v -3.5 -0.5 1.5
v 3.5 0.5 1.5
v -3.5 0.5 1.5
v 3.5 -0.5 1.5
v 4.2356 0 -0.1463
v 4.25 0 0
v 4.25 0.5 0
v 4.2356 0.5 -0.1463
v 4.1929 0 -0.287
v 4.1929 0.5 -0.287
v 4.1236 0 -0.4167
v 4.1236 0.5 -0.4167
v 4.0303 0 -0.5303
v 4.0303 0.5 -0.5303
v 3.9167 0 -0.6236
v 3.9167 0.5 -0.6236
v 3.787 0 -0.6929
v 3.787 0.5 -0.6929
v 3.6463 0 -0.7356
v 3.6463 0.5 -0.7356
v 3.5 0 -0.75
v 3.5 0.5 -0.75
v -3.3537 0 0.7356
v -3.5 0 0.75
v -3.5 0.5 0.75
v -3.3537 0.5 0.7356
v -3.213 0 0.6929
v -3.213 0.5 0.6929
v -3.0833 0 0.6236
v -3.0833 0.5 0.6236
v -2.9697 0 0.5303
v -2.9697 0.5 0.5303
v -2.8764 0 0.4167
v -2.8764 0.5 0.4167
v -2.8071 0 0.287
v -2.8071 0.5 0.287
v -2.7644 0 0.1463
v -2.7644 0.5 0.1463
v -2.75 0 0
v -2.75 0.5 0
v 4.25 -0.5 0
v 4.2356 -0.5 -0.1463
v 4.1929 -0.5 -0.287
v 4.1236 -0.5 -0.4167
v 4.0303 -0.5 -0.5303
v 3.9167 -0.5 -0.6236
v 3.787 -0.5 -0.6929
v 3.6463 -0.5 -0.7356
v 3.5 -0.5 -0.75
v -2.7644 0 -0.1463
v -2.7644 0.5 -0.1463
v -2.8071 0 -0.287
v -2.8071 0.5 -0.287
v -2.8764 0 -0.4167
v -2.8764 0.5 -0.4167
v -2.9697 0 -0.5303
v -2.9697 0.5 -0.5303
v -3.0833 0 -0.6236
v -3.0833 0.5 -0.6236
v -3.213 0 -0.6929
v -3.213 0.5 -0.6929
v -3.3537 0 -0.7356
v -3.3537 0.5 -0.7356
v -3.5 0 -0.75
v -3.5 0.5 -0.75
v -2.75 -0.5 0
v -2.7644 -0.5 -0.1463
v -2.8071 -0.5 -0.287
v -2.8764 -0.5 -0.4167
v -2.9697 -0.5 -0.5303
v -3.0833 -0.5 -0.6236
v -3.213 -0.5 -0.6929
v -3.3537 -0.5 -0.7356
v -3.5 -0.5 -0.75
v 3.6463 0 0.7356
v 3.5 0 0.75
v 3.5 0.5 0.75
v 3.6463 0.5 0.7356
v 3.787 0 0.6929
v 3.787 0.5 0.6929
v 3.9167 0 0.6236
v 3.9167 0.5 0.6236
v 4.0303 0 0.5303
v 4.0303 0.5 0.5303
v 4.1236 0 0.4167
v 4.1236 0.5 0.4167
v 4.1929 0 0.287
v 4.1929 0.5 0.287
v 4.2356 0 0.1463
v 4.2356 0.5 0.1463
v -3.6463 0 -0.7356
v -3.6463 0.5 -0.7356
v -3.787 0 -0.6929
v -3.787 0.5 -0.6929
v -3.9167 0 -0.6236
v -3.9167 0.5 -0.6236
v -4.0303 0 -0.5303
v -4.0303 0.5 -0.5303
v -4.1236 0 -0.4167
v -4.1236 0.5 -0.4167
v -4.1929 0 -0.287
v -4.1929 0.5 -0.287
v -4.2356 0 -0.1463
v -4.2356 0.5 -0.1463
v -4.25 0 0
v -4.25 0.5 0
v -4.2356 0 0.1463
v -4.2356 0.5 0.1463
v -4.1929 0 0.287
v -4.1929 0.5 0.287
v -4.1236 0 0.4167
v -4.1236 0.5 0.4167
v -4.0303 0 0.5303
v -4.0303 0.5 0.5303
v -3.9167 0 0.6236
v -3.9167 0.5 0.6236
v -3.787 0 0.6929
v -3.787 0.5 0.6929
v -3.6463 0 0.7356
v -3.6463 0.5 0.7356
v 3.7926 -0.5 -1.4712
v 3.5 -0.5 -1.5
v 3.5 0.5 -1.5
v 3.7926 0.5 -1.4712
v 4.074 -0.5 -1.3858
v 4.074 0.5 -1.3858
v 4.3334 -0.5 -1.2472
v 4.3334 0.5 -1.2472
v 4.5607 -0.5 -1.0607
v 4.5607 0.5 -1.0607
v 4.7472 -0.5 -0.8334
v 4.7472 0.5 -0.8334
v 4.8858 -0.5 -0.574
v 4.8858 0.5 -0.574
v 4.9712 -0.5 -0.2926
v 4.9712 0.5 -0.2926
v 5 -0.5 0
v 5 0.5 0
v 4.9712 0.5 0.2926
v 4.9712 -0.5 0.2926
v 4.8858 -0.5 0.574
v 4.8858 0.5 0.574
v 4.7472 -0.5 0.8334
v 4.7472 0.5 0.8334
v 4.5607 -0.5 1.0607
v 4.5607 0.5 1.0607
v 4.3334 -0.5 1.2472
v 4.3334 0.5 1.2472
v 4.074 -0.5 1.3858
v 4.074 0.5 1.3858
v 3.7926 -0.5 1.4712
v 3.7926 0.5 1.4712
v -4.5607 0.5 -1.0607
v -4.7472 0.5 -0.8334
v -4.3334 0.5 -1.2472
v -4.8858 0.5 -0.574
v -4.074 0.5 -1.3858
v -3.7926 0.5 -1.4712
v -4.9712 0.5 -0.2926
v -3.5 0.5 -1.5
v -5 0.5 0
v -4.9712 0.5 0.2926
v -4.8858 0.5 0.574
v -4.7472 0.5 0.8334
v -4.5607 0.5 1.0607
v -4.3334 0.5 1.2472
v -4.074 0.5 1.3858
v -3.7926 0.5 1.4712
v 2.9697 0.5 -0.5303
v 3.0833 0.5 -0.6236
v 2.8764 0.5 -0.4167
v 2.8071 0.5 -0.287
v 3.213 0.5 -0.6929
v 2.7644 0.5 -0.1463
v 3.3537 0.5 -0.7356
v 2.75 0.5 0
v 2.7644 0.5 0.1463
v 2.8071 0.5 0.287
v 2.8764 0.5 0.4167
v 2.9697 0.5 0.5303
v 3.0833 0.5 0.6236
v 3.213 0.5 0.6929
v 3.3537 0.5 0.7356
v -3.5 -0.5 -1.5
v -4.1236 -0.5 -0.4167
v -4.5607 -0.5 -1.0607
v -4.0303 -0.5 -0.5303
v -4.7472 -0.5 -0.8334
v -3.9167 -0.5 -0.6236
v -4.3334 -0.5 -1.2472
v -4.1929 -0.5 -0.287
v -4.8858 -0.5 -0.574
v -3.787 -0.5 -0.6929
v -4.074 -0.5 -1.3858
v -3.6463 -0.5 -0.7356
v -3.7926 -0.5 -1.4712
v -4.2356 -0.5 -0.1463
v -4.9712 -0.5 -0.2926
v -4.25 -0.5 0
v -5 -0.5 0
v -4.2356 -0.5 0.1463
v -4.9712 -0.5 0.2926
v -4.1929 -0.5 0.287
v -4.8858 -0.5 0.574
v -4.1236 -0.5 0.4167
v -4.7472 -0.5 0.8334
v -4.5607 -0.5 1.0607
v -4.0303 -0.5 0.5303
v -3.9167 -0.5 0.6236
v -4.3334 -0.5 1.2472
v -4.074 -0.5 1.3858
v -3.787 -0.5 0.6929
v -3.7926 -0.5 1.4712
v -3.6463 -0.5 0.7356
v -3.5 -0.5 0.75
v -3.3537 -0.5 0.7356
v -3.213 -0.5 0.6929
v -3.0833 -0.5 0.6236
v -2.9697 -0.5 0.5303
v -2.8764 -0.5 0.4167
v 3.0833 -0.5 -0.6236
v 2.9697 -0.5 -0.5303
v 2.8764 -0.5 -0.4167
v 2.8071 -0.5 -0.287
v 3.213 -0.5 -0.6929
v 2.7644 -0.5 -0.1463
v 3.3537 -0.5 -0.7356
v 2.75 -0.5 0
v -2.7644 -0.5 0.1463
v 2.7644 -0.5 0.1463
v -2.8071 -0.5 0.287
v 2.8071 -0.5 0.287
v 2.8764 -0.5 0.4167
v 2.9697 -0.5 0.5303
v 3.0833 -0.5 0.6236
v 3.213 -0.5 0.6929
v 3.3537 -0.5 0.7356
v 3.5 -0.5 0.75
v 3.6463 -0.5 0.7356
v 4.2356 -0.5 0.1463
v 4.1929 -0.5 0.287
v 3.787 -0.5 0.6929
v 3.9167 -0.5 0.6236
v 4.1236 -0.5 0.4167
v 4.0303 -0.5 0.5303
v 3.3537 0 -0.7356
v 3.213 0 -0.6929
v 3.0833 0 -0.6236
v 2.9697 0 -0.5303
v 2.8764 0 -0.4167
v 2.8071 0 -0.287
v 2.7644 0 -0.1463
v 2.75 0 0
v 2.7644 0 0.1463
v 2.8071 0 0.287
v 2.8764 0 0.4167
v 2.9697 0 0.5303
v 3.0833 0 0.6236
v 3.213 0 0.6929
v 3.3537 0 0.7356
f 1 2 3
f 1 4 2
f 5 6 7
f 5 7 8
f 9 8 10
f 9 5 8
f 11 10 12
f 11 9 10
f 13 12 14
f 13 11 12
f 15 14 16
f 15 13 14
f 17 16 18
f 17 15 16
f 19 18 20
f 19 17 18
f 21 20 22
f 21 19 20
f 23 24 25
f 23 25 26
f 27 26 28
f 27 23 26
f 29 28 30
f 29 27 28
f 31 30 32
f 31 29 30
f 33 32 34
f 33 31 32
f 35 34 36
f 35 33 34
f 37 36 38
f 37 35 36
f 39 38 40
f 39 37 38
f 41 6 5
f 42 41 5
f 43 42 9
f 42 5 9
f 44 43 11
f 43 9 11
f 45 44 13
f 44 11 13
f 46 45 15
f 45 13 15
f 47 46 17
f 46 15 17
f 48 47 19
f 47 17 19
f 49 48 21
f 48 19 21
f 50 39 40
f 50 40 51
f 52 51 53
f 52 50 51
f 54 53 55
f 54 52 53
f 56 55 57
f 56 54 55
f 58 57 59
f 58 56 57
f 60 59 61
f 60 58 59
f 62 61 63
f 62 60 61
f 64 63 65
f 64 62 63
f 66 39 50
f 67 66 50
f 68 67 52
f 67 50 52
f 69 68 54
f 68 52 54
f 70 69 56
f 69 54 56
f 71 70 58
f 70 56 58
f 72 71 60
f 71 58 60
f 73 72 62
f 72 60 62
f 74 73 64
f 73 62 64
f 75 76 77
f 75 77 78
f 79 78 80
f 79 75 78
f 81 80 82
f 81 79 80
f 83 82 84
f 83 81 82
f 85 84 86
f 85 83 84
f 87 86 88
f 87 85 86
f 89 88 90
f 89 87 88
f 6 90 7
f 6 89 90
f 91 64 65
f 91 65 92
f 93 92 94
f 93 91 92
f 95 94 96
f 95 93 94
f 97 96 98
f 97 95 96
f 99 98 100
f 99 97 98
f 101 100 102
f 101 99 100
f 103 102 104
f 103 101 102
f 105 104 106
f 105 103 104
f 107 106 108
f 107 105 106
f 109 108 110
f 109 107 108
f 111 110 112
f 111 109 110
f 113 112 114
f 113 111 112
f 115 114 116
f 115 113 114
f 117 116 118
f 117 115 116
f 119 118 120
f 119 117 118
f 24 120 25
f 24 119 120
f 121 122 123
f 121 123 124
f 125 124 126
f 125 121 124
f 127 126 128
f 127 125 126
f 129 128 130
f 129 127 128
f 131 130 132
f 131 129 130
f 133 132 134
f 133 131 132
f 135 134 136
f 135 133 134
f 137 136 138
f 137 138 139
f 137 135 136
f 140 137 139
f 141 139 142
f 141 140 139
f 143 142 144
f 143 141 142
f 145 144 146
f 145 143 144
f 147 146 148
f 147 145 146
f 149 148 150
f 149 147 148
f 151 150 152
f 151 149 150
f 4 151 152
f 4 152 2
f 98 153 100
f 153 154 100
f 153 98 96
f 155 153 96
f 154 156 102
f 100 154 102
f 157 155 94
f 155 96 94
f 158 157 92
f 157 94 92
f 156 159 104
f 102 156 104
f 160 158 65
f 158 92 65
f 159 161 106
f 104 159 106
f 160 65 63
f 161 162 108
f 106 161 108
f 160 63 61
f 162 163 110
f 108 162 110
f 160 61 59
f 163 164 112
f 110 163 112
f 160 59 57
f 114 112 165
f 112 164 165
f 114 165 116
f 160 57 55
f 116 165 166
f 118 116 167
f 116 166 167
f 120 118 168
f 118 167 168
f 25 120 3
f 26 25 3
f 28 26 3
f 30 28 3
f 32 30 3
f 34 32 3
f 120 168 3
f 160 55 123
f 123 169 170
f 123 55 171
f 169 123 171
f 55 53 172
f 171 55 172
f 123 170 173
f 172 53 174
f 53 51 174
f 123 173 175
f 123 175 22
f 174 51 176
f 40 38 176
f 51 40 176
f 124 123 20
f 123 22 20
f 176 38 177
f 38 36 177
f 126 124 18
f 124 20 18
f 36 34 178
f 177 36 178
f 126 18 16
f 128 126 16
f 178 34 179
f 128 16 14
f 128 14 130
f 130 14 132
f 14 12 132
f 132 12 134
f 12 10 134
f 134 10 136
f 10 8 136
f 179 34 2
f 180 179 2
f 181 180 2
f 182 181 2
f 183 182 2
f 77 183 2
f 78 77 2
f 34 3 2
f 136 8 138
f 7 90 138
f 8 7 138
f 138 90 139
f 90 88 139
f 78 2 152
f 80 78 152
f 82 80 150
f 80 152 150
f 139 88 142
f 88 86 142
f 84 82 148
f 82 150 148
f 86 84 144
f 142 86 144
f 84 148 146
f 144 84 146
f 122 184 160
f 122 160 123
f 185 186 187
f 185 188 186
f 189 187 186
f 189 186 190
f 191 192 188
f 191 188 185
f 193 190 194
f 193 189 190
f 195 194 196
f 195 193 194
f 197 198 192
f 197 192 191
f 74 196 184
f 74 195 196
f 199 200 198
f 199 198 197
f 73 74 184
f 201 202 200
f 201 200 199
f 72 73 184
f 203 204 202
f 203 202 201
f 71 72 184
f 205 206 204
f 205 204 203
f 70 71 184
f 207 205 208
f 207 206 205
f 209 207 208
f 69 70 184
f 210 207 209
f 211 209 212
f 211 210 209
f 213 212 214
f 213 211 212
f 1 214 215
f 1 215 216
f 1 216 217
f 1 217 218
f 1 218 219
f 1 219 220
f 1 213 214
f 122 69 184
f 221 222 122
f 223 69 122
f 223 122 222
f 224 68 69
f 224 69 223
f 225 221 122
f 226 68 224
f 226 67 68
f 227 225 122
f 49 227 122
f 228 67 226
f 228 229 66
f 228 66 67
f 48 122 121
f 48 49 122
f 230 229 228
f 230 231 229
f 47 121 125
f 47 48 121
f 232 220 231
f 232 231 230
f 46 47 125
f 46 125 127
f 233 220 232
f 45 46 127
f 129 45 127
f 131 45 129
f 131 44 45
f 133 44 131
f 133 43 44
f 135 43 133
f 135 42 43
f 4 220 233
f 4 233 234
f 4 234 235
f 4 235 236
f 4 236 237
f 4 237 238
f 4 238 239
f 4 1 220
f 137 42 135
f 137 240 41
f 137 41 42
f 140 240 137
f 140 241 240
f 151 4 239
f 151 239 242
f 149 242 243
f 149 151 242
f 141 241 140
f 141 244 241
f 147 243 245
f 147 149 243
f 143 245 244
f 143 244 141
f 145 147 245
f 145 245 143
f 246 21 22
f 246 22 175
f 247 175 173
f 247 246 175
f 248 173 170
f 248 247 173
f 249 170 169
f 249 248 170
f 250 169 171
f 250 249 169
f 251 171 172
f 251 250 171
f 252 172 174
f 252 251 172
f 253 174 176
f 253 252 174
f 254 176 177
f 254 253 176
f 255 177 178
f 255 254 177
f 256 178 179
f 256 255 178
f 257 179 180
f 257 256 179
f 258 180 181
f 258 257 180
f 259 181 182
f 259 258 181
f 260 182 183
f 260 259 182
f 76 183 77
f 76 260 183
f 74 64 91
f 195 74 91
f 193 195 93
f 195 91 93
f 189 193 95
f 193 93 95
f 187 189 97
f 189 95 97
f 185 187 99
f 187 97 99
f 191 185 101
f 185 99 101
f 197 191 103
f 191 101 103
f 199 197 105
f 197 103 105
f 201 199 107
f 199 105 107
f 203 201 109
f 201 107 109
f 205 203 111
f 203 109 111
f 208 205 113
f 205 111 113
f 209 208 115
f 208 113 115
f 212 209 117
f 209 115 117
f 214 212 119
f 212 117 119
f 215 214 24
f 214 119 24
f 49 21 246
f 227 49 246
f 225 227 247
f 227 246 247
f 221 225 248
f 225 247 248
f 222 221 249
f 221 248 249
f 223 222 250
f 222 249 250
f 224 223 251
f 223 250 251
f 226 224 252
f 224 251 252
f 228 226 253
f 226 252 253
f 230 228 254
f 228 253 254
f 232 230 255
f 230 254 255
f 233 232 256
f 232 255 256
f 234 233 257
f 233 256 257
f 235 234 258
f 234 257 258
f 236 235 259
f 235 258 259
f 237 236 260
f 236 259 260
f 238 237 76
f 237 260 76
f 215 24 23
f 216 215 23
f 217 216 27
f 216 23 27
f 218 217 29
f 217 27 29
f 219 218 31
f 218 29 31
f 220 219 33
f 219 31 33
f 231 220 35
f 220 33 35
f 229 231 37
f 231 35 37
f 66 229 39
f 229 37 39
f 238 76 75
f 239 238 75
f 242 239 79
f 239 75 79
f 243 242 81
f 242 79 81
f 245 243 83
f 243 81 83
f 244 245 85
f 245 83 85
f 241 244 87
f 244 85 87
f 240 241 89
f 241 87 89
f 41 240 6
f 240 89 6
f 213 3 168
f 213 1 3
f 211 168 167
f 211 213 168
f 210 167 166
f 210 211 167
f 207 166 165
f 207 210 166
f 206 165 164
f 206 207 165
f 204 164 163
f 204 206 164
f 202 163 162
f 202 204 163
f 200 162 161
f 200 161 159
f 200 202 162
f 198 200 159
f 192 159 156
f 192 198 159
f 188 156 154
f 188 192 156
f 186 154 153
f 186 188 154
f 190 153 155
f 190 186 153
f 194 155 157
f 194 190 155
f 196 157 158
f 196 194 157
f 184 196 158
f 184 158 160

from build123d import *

# Parameters (mm, degrees)
F1_DEPTH = 0.5


with BuildPart() as f1:
    # F0 (on Front) → F1 (new body, symmetric)
    with BuildSketch(Plane.XZ):
        with BuildLine():
            Line((-3.5, 0.75), (-3.5, 1.5))
            ThreePointArc((-3.5, 1.5), (-5, 0), (-3.5, -1.5))
            Line((-3.5, -1.5), (-3.5, -0.75))
            ThreePointArc((-3.5, -0.75), (-4.25, 0), (-3.5, 0.75))
        make_face()
        with BuildLine():
            ThreePointArc((3.5, -1.5), (5, 0), (3.5, 1.5))
            Line((3.5, 1.5), (3.5, 0.75))
            ThreePointArc((3.5, 0.75), (4.0303300859, 0.5303300859), (4.25, 0))
            ThreePointArc((4.25, 0), (4.0303300859, -0.5303300859), (3.5, -0.75))
            Line((3.5, -0.75), (3.5, -1.5))
        make_face()
        with BuildLine():
            Line((3.5, 1.5), (-3.5, 1.5))
            Line((-3.5, 1.5), (-3.5, 0.75))
            ThreePointArc((-3.5, 0.75), (-2.9696699141, 0.5303300859), (-2.75, 0))
            ThreePointArc((-2.75, 0), (-2.9696699141, -0.5303300859), (-3.5, -0.75))
            Line((-3.5, -0.75), (-3.5, -1.5))
            Line((-3.5, -1.5), (3.5, -1.5))
            Line((3.5, -1.5), (3.5, -0.75))
            ThreePointArc((3.5, -0.75), (2.75, 0), (3.5, 0.75))
            Line((3.5, 0.75), (3.5, 1.5))
        make_face()
    extrude(amount=F1_DEPTH, both=True)


solid = f1.part
